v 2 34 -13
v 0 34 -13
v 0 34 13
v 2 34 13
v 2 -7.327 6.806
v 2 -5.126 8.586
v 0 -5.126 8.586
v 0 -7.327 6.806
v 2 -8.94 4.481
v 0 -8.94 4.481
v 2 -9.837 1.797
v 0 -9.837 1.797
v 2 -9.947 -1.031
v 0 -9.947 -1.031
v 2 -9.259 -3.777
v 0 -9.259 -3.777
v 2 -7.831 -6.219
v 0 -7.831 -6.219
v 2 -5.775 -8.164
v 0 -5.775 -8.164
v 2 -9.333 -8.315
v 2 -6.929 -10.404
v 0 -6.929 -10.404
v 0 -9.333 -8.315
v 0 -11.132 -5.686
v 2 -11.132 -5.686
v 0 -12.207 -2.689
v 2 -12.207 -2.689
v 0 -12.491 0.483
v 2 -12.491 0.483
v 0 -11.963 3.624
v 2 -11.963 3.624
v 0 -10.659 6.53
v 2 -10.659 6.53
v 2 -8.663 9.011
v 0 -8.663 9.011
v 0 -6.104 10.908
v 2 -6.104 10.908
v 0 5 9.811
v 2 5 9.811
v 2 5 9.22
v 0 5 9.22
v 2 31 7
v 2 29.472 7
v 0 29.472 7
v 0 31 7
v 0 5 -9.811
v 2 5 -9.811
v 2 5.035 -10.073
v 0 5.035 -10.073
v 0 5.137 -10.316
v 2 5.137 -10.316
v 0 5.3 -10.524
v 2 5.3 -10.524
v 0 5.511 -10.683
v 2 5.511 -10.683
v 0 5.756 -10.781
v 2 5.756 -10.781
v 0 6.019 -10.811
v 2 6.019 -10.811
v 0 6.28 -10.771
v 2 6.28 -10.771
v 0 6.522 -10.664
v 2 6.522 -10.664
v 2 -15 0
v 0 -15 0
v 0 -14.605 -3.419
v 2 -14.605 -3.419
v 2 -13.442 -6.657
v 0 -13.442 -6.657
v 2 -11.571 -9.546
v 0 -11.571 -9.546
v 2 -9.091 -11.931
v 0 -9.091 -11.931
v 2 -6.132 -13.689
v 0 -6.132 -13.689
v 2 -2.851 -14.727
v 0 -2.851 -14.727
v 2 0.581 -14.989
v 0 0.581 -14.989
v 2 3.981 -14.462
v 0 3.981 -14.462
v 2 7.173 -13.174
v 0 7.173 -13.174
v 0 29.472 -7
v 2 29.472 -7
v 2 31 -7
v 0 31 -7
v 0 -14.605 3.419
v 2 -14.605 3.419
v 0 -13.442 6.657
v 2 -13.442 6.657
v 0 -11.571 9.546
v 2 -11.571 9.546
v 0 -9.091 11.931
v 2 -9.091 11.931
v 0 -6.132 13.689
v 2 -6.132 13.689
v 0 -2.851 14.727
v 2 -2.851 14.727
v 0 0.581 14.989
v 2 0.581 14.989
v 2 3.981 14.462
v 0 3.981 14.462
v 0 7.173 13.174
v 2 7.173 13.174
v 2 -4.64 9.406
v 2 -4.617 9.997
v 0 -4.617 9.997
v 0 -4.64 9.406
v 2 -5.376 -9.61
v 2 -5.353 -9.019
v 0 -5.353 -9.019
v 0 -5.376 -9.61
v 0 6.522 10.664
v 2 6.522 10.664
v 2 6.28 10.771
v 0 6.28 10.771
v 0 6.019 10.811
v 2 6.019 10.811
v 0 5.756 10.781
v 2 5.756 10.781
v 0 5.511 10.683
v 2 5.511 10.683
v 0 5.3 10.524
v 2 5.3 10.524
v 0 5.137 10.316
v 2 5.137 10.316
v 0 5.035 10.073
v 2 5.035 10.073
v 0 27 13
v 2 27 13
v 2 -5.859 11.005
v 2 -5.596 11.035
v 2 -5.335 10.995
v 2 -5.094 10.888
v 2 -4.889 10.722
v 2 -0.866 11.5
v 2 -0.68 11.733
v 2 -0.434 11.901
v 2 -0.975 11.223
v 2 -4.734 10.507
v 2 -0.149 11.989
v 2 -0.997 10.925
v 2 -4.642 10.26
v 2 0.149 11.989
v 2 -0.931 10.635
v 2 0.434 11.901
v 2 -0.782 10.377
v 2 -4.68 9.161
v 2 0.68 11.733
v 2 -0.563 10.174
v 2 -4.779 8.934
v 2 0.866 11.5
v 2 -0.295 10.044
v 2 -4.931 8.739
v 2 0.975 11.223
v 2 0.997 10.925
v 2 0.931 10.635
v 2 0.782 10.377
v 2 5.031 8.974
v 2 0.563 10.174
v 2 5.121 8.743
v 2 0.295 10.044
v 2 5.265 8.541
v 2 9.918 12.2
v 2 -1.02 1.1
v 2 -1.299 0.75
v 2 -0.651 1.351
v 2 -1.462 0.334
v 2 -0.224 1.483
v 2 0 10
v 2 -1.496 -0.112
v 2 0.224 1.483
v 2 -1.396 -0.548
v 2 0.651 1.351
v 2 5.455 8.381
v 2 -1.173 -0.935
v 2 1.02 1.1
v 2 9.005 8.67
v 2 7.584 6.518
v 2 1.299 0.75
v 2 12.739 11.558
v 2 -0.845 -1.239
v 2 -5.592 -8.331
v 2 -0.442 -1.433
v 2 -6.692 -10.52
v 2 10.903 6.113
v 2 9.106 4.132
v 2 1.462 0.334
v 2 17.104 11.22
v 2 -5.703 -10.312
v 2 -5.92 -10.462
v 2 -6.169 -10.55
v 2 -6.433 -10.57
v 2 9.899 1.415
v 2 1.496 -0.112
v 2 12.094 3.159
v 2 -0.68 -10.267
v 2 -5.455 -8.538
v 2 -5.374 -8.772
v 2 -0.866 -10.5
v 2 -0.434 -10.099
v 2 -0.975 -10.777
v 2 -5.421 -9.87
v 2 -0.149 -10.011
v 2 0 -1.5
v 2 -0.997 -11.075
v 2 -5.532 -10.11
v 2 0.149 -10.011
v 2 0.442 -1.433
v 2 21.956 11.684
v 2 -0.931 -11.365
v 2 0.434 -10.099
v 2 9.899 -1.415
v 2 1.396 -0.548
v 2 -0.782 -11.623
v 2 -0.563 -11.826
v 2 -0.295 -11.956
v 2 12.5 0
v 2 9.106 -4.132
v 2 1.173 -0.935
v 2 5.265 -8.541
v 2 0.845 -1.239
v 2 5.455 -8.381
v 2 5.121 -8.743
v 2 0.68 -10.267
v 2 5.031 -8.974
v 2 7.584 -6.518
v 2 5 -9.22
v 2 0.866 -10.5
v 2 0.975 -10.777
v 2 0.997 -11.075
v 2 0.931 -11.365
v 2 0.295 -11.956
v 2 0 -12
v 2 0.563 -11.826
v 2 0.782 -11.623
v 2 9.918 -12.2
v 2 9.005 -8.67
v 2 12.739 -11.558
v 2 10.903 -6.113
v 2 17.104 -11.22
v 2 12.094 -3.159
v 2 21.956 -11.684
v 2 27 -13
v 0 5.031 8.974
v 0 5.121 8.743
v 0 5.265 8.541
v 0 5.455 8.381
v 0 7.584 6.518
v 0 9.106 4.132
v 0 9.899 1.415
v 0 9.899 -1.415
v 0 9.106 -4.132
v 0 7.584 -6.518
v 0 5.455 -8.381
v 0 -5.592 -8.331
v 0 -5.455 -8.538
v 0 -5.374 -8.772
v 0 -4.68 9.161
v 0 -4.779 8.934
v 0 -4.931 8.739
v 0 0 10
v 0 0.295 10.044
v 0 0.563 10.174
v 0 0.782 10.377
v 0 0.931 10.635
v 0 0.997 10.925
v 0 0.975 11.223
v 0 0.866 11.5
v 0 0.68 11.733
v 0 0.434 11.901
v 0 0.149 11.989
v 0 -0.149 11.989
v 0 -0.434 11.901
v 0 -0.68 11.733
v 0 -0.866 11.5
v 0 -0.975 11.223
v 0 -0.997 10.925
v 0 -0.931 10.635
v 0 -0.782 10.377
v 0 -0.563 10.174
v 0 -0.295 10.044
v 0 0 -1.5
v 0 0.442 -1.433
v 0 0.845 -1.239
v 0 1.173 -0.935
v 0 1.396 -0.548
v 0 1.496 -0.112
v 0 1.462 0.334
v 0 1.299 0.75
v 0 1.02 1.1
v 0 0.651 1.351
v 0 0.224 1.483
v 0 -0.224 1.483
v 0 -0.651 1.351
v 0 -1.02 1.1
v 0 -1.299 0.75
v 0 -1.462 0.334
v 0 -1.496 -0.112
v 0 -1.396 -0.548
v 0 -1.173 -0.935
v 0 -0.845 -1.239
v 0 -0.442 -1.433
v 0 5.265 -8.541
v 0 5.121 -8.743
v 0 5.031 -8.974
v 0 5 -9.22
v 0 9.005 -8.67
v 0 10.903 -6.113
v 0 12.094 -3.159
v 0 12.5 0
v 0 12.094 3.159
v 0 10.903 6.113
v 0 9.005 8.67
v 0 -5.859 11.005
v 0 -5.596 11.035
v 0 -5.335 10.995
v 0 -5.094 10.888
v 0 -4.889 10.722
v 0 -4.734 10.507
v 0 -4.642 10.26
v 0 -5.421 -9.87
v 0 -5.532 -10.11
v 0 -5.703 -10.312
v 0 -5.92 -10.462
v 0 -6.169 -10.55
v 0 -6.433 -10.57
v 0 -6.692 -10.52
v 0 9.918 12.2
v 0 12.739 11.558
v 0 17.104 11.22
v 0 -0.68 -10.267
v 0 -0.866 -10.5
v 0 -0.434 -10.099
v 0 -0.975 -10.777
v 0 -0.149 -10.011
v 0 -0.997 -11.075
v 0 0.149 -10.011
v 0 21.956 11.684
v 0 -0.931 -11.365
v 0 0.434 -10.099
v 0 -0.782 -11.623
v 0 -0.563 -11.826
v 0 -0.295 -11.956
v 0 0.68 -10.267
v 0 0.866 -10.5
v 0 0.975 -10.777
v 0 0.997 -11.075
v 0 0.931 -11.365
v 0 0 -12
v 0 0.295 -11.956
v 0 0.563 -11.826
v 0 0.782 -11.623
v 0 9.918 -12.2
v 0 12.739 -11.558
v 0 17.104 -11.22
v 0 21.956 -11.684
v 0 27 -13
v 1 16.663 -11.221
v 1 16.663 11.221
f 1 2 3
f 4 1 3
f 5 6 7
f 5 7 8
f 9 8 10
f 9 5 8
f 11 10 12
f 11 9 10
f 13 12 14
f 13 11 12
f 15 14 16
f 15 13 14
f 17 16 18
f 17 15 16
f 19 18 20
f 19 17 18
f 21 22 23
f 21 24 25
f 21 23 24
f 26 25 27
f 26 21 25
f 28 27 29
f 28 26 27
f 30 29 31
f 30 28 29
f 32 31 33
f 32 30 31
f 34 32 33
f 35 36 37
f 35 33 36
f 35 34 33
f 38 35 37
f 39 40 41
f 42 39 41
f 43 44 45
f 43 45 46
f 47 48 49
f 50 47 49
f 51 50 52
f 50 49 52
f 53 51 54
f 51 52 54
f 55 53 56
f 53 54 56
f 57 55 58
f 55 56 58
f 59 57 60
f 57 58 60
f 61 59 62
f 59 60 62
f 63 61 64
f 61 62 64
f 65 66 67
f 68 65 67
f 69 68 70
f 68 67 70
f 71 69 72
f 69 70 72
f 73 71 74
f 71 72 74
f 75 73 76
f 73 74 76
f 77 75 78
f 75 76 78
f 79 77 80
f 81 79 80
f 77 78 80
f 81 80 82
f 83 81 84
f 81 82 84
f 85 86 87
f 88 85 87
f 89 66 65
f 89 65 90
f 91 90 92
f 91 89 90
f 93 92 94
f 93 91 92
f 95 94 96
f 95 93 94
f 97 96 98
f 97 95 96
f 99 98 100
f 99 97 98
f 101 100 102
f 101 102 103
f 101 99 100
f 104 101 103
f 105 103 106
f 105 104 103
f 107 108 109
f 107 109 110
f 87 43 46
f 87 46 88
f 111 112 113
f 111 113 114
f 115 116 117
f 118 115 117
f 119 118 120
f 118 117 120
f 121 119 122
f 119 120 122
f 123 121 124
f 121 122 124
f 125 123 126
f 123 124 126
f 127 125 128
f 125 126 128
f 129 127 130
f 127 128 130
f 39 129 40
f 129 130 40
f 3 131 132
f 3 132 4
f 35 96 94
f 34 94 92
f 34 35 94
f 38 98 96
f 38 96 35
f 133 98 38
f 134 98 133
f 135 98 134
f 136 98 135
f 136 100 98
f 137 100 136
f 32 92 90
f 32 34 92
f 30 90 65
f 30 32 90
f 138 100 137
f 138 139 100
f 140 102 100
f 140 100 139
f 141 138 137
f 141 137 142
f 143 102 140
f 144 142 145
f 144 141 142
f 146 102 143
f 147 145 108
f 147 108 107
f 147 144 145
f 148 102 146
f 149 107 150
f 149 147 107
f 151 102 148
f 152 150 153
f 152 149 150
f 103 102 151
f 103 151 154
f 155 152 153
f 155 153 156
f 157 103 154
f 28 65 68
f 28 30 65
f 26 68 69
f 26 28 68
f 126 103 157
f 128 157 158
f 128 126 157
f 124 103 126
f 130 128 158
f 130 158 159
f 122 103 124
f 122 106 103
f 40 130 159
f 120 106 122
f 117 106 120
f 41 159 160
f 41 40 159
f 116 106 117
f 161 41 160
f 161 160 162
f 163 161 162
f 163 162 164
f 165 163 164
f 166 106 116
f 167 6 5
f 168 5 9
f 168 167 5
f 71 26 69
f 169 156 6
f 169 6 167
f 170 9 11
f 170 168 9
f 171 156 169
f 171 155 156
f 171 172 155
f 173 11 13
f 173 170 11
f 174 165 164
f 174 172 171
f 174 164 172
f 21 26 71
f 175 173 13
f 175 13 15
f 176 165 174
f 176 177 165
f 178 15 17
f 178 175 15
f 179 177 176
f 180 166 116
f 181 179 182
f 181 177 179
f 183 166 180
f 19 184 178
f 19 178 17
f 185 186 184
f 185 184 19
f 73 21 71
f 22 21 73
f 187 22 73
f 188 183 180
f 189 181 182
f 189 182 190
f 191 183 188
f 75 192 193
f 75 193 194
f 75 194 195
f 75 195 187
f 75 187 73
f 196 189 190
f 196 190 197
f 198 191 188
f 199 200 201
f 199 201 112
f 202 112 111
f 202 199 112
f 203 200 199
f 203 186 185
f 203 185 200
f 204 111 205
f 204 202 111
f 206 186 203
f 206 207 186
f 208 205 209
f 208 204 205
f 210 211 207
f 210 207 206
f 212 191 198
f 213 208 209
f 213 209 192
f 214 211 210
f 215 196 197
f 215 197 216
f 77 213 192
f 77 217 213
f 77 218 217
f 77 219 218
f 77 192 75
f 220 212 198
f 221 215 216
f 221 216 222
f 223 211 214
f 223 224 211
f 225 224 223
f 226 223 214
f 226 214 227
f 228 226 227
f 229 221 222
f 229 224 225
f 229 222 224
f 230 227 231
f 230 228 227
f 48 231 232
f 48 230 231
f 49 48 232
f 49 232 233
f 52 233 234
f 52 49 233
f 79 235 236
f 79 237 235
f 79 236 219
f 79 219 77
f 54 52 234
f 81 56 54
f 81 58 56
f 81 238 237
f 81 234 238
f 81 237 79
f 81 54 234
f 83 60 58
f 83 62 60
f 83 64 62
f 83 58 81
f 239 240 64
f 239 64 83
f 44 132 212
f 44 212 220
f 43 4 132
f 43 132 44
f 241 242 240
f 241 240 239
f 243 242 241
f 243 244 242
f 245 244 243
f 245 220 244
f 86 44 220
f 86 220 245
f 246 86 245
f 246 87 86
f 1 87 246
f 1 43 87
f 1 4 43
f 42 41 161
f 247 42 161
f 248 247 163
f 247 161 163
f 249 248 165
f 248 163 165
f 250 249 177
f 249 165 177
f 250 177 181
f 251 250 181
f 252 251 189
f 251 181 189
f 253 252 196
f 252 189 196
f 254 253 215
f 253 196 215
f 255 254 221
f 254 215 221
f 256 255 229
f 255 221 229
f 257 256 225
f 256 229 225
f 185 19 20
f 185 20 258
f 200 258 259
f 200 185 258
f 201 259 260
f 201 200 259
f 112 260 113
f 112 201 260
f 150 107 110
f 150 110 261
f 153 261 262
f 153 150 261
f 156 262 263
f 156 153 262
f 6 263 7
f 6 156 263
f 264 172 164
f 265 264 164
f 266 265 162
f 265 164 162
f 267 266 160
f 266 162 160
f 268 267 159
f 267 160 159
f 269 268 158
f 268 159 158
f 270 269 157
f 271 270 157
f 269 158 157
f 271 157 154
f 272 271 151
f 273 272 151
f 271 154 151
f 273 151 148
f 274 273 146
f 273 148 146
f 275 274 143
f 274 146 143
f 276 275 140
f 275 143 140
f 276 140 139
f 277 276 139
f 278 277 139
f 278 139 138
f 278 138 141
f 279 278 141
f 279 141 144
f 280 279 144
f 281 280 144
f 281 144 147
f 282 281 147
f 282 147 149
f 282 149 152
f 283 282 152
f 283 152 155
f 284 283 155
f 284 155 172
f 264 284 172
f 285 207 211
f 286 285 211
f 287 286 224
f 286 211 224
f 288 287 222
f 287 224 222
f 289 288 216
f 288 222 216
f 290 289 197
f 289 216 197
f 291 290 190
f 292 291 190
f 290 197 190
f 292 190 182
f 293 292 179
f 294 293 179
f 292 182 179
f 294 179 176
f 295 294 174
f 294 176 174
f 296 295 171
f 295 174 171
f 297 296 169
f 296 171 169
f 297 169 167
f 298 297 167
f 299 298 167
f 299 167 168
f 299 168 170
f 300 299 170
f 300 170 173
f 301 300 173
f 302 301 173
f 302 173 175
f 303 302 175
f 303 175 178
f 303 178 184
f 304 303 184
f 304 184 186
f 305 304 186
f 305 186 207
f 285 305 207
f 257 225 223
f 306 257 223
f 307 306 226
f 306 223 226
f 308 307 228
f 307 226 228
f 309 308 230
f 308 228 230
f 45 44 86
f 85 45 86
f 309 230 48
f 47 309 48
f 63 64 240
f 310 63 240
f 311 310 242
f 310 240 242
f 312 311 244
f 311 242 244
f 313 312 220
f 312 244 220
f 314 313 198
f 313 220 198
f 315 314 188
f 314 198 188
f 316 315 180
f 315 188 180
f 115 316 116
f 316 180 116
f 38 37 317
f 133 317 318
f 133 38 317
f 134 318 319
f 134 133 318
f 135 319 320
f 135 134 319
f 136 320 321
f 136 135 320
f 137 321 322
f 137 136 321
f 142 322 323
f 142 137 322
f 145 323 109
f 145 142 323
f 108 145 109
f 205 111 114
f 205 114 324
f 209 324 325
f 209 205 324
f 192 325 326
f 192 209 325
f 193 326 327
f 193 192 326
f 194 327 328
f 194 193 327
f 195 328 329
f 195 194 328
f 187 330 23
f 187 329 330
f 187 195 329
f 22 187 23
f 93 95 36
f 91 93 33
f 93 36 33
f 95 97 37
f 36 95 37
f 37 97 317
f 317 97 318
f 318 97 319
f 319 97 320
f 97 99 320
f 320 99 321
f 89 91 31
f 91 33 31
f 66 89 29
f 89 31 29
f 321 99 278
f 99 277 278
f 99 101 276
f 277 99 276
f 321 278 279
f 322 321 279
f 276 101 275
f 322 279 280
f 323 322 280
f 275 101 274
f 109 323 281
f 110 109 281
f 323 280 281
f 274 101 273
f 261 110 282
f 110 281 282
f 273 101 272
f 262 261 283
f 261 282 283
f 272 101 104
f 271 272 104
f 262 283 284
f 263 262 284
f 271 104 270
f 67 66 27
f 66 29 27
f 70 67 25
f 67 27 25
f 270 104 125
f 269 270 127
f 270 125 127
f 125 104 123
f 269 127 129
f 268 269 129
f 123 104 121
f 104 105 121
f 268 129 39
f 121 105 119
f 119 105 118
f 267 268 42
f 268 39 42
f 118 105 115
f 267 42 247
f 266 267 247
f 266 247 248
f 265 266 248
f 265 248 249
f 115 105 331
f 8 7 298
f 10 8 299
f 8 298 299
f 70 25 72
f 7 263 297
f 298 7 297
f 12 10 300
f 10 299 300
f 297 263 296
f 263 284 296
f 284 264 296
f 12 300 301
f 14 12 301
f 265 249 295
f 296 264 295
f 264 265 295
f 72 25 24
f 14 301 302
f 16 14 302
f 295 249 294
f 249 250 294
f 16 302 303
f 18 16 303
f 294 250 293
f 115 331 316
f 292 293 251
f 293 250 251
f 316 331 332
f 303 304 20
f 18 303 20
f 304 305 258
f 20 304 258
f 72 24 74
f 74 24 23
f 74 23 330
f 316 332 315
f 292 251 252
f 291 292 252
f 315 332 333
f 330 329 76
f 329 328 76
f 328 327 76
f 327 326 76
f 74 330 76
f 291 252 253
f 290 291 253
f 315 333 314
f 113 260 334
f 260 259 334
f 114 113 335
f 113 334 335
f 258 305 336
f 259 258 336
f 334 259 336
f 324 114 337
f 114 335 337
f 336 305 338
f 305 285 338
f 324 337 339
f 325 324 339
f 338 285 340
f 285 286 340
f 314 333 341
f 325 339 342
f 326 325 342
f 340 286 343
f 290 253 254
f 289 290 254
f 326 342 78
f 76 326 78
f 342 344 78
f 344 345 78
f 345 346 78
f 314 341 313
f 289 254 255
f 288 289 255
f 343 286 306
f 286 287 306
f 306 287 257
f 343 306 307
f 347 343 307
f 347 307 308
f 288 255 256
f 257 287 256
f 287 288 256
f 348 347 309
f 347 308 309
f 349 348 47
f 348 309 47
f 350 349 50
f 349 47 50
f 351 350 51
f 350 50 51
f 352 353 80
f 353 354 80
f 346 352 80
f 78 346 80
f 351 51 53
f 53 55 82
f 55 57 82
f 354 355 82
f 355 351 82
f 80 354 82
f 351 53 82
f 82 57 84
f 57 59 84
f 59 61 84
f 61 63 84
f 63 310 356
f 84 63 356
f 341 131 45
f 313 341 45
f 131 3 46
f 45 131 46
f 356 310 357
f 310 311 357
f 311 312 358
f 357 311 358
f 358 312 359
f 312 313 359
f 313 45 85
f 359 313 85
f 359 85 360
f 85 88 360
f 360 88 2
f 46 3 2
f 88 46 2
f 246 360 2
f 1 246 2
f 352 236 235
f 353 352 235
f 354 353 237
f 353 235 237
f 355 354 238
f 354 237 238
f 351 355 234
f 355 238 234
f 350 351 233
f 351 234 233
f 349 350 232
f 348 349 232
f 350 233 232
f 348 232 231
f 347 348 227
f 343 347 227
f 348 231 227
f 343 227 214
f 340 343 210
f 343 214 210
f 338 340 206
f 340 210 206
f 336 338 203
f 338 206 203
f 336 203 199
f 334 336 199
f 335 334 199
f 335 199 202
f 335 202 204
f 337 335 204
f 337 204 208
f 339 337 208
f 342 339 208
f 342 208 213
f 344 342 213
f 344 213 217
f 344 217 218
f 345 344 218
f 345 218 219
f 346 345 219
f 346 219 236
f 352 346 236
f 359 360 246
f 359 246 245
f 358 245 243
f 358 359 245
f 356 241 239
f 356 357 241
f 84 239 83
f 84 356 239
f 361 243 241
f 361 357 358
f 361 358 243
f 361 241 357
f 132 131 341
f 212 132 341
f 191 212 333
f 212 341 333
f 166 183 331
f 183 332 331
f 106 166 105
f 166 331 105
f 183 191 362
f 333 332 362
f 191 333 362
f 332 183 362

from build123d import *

# Parameters (mm, degrees)
RESSALTO_EXTRUS_O1_DEPTH = 2
ESBO_O2_R                = 1.5
ESBO_O2_R_2              = 1
ESBO_O2_W                = 14
ESBO_O2_H                = 1.527880785
CORTE_EXTRUS_O1_DEPTH    = 3.0000001


with BuildPart() as part:
    # Esboço1 → Ressalto-extrusão1 (new body)
    with BuildSketch(Plane(origin=(0, 0, 0), x_dir=(0, 0, -1), z_dir=(1, 0, 0))):
        with BuildLine():
            Line((-13, 34), (0, 34))
            Line((0, 34), (0, -15))
            ThreePointArc((0, -15), (-12.895532653, -7.661934325), (-13.173963237, 7.172634986))
            add(Edge.make_bspline(
                [(-13, 27), (-9.354199414, 16.239964162), (-13.173963237, 7.172634986)],
                knots=[0, 0, 0, 0.912495845, 0.912495845, 0.912495845], degree=2))
            Line((-13, 27), (-13, 34))
        make_face()
    ressalto_extrus_o1 = extrude(amount=RESSALTO_EXTRUS_O1_DEPTH)

    # Espelhar1: Ressalto-extrusão1 across plane
    add(ressalto_extrus_o1.mirror(Plane(origin=(2, 34, 0), x_dir=(1, 0, 0), z_dir=(0, 0, 1))))

    # Esboço2 → Corte-extrusão1 (cut, through all)
    with BuildSketch(Plane(origin=(2, 0, 0), x_dir=(0, 0, -1), z_dir=(1, 0, 0))):
        Circle(ESBO_O2_R)
        with Locations((11, 0)):
            Circle(ESBO_O2_R_2)
        with Locations((-11, 0)):
            Circle(ESBO_O2_R_2)
        with Locations((0, 30.236059608)):
            Rectangle(ESBO_O2_W, ESBO_O2_H)
        with BuildLine():
            Line((-9.810708435, 5), (-9.219544457, 5))
            ThreePointArc((-9.219544457, 5), (-8.742813163, 5.120950927), (-8.381404052, 5.454545455))
            ThreePointArc((-8.381404052, 5.454545455), (0, 10), (8.381404052, 5.454545455))
            ThreePointArc((8.381404052, 5.454545455), (8.742813163, 5.120950927), (9.219544457, 5))
            Line((9.219544457, 5), (9.810708435, 5))
            ThreePointArc((9.810708435, 5), (10.682986811, 5.510990353), (10.663813516, 6.52173913))
            ThreePointArc((10.663813516, 6.52173913), (0, 12.5), (-10.663813516, 6.52173913))
            ThreePointArc((-10.663813516, 6.52173913), (-10.682986811, 5.510990353), (-9.810708435, 5))
        make_face()
        with BuildLine():
            Line((-9.996736389, -4.616845413), (-9.40601466, -4.639707772))
            ThreePointArc((-9.40601466, -4.639707772), (-8.934317599, -4.779005068), (-8.586080114, -5.126326976))
            ThreePointArc((-8.586080114, -5.126326976), (-0.386734657, -9.992519017), (8.164187762, -5.77460286))
            ThreePointArc((8.164187762, -5.77460286), (8.538227759, -5.455234837), (9.019280003, -5.352811245))
            Line((9.019280003, -5.352811245), (9.610001733, -5.375673604))
            ThreePointArc((9.610001733, -5.375673604), (10.461865791, -5.920015714), (10.403617681, -6.929266854))
            ThreePointArc((10.403617681, -6.929266854), (-0.483418321, -12.490648771), (-10.90805419, -6.104453603))
            ThreePointArc((-10.90805419, -6.104453603), (-10.888123983, -5.093719467), (-9.996736389, -4.616845413))
        make_face()
    extrude(amount=-CORTE_EXTRUS_O1_DEPTH, mode=Mode.SUBTRACT)


solid = part.part
